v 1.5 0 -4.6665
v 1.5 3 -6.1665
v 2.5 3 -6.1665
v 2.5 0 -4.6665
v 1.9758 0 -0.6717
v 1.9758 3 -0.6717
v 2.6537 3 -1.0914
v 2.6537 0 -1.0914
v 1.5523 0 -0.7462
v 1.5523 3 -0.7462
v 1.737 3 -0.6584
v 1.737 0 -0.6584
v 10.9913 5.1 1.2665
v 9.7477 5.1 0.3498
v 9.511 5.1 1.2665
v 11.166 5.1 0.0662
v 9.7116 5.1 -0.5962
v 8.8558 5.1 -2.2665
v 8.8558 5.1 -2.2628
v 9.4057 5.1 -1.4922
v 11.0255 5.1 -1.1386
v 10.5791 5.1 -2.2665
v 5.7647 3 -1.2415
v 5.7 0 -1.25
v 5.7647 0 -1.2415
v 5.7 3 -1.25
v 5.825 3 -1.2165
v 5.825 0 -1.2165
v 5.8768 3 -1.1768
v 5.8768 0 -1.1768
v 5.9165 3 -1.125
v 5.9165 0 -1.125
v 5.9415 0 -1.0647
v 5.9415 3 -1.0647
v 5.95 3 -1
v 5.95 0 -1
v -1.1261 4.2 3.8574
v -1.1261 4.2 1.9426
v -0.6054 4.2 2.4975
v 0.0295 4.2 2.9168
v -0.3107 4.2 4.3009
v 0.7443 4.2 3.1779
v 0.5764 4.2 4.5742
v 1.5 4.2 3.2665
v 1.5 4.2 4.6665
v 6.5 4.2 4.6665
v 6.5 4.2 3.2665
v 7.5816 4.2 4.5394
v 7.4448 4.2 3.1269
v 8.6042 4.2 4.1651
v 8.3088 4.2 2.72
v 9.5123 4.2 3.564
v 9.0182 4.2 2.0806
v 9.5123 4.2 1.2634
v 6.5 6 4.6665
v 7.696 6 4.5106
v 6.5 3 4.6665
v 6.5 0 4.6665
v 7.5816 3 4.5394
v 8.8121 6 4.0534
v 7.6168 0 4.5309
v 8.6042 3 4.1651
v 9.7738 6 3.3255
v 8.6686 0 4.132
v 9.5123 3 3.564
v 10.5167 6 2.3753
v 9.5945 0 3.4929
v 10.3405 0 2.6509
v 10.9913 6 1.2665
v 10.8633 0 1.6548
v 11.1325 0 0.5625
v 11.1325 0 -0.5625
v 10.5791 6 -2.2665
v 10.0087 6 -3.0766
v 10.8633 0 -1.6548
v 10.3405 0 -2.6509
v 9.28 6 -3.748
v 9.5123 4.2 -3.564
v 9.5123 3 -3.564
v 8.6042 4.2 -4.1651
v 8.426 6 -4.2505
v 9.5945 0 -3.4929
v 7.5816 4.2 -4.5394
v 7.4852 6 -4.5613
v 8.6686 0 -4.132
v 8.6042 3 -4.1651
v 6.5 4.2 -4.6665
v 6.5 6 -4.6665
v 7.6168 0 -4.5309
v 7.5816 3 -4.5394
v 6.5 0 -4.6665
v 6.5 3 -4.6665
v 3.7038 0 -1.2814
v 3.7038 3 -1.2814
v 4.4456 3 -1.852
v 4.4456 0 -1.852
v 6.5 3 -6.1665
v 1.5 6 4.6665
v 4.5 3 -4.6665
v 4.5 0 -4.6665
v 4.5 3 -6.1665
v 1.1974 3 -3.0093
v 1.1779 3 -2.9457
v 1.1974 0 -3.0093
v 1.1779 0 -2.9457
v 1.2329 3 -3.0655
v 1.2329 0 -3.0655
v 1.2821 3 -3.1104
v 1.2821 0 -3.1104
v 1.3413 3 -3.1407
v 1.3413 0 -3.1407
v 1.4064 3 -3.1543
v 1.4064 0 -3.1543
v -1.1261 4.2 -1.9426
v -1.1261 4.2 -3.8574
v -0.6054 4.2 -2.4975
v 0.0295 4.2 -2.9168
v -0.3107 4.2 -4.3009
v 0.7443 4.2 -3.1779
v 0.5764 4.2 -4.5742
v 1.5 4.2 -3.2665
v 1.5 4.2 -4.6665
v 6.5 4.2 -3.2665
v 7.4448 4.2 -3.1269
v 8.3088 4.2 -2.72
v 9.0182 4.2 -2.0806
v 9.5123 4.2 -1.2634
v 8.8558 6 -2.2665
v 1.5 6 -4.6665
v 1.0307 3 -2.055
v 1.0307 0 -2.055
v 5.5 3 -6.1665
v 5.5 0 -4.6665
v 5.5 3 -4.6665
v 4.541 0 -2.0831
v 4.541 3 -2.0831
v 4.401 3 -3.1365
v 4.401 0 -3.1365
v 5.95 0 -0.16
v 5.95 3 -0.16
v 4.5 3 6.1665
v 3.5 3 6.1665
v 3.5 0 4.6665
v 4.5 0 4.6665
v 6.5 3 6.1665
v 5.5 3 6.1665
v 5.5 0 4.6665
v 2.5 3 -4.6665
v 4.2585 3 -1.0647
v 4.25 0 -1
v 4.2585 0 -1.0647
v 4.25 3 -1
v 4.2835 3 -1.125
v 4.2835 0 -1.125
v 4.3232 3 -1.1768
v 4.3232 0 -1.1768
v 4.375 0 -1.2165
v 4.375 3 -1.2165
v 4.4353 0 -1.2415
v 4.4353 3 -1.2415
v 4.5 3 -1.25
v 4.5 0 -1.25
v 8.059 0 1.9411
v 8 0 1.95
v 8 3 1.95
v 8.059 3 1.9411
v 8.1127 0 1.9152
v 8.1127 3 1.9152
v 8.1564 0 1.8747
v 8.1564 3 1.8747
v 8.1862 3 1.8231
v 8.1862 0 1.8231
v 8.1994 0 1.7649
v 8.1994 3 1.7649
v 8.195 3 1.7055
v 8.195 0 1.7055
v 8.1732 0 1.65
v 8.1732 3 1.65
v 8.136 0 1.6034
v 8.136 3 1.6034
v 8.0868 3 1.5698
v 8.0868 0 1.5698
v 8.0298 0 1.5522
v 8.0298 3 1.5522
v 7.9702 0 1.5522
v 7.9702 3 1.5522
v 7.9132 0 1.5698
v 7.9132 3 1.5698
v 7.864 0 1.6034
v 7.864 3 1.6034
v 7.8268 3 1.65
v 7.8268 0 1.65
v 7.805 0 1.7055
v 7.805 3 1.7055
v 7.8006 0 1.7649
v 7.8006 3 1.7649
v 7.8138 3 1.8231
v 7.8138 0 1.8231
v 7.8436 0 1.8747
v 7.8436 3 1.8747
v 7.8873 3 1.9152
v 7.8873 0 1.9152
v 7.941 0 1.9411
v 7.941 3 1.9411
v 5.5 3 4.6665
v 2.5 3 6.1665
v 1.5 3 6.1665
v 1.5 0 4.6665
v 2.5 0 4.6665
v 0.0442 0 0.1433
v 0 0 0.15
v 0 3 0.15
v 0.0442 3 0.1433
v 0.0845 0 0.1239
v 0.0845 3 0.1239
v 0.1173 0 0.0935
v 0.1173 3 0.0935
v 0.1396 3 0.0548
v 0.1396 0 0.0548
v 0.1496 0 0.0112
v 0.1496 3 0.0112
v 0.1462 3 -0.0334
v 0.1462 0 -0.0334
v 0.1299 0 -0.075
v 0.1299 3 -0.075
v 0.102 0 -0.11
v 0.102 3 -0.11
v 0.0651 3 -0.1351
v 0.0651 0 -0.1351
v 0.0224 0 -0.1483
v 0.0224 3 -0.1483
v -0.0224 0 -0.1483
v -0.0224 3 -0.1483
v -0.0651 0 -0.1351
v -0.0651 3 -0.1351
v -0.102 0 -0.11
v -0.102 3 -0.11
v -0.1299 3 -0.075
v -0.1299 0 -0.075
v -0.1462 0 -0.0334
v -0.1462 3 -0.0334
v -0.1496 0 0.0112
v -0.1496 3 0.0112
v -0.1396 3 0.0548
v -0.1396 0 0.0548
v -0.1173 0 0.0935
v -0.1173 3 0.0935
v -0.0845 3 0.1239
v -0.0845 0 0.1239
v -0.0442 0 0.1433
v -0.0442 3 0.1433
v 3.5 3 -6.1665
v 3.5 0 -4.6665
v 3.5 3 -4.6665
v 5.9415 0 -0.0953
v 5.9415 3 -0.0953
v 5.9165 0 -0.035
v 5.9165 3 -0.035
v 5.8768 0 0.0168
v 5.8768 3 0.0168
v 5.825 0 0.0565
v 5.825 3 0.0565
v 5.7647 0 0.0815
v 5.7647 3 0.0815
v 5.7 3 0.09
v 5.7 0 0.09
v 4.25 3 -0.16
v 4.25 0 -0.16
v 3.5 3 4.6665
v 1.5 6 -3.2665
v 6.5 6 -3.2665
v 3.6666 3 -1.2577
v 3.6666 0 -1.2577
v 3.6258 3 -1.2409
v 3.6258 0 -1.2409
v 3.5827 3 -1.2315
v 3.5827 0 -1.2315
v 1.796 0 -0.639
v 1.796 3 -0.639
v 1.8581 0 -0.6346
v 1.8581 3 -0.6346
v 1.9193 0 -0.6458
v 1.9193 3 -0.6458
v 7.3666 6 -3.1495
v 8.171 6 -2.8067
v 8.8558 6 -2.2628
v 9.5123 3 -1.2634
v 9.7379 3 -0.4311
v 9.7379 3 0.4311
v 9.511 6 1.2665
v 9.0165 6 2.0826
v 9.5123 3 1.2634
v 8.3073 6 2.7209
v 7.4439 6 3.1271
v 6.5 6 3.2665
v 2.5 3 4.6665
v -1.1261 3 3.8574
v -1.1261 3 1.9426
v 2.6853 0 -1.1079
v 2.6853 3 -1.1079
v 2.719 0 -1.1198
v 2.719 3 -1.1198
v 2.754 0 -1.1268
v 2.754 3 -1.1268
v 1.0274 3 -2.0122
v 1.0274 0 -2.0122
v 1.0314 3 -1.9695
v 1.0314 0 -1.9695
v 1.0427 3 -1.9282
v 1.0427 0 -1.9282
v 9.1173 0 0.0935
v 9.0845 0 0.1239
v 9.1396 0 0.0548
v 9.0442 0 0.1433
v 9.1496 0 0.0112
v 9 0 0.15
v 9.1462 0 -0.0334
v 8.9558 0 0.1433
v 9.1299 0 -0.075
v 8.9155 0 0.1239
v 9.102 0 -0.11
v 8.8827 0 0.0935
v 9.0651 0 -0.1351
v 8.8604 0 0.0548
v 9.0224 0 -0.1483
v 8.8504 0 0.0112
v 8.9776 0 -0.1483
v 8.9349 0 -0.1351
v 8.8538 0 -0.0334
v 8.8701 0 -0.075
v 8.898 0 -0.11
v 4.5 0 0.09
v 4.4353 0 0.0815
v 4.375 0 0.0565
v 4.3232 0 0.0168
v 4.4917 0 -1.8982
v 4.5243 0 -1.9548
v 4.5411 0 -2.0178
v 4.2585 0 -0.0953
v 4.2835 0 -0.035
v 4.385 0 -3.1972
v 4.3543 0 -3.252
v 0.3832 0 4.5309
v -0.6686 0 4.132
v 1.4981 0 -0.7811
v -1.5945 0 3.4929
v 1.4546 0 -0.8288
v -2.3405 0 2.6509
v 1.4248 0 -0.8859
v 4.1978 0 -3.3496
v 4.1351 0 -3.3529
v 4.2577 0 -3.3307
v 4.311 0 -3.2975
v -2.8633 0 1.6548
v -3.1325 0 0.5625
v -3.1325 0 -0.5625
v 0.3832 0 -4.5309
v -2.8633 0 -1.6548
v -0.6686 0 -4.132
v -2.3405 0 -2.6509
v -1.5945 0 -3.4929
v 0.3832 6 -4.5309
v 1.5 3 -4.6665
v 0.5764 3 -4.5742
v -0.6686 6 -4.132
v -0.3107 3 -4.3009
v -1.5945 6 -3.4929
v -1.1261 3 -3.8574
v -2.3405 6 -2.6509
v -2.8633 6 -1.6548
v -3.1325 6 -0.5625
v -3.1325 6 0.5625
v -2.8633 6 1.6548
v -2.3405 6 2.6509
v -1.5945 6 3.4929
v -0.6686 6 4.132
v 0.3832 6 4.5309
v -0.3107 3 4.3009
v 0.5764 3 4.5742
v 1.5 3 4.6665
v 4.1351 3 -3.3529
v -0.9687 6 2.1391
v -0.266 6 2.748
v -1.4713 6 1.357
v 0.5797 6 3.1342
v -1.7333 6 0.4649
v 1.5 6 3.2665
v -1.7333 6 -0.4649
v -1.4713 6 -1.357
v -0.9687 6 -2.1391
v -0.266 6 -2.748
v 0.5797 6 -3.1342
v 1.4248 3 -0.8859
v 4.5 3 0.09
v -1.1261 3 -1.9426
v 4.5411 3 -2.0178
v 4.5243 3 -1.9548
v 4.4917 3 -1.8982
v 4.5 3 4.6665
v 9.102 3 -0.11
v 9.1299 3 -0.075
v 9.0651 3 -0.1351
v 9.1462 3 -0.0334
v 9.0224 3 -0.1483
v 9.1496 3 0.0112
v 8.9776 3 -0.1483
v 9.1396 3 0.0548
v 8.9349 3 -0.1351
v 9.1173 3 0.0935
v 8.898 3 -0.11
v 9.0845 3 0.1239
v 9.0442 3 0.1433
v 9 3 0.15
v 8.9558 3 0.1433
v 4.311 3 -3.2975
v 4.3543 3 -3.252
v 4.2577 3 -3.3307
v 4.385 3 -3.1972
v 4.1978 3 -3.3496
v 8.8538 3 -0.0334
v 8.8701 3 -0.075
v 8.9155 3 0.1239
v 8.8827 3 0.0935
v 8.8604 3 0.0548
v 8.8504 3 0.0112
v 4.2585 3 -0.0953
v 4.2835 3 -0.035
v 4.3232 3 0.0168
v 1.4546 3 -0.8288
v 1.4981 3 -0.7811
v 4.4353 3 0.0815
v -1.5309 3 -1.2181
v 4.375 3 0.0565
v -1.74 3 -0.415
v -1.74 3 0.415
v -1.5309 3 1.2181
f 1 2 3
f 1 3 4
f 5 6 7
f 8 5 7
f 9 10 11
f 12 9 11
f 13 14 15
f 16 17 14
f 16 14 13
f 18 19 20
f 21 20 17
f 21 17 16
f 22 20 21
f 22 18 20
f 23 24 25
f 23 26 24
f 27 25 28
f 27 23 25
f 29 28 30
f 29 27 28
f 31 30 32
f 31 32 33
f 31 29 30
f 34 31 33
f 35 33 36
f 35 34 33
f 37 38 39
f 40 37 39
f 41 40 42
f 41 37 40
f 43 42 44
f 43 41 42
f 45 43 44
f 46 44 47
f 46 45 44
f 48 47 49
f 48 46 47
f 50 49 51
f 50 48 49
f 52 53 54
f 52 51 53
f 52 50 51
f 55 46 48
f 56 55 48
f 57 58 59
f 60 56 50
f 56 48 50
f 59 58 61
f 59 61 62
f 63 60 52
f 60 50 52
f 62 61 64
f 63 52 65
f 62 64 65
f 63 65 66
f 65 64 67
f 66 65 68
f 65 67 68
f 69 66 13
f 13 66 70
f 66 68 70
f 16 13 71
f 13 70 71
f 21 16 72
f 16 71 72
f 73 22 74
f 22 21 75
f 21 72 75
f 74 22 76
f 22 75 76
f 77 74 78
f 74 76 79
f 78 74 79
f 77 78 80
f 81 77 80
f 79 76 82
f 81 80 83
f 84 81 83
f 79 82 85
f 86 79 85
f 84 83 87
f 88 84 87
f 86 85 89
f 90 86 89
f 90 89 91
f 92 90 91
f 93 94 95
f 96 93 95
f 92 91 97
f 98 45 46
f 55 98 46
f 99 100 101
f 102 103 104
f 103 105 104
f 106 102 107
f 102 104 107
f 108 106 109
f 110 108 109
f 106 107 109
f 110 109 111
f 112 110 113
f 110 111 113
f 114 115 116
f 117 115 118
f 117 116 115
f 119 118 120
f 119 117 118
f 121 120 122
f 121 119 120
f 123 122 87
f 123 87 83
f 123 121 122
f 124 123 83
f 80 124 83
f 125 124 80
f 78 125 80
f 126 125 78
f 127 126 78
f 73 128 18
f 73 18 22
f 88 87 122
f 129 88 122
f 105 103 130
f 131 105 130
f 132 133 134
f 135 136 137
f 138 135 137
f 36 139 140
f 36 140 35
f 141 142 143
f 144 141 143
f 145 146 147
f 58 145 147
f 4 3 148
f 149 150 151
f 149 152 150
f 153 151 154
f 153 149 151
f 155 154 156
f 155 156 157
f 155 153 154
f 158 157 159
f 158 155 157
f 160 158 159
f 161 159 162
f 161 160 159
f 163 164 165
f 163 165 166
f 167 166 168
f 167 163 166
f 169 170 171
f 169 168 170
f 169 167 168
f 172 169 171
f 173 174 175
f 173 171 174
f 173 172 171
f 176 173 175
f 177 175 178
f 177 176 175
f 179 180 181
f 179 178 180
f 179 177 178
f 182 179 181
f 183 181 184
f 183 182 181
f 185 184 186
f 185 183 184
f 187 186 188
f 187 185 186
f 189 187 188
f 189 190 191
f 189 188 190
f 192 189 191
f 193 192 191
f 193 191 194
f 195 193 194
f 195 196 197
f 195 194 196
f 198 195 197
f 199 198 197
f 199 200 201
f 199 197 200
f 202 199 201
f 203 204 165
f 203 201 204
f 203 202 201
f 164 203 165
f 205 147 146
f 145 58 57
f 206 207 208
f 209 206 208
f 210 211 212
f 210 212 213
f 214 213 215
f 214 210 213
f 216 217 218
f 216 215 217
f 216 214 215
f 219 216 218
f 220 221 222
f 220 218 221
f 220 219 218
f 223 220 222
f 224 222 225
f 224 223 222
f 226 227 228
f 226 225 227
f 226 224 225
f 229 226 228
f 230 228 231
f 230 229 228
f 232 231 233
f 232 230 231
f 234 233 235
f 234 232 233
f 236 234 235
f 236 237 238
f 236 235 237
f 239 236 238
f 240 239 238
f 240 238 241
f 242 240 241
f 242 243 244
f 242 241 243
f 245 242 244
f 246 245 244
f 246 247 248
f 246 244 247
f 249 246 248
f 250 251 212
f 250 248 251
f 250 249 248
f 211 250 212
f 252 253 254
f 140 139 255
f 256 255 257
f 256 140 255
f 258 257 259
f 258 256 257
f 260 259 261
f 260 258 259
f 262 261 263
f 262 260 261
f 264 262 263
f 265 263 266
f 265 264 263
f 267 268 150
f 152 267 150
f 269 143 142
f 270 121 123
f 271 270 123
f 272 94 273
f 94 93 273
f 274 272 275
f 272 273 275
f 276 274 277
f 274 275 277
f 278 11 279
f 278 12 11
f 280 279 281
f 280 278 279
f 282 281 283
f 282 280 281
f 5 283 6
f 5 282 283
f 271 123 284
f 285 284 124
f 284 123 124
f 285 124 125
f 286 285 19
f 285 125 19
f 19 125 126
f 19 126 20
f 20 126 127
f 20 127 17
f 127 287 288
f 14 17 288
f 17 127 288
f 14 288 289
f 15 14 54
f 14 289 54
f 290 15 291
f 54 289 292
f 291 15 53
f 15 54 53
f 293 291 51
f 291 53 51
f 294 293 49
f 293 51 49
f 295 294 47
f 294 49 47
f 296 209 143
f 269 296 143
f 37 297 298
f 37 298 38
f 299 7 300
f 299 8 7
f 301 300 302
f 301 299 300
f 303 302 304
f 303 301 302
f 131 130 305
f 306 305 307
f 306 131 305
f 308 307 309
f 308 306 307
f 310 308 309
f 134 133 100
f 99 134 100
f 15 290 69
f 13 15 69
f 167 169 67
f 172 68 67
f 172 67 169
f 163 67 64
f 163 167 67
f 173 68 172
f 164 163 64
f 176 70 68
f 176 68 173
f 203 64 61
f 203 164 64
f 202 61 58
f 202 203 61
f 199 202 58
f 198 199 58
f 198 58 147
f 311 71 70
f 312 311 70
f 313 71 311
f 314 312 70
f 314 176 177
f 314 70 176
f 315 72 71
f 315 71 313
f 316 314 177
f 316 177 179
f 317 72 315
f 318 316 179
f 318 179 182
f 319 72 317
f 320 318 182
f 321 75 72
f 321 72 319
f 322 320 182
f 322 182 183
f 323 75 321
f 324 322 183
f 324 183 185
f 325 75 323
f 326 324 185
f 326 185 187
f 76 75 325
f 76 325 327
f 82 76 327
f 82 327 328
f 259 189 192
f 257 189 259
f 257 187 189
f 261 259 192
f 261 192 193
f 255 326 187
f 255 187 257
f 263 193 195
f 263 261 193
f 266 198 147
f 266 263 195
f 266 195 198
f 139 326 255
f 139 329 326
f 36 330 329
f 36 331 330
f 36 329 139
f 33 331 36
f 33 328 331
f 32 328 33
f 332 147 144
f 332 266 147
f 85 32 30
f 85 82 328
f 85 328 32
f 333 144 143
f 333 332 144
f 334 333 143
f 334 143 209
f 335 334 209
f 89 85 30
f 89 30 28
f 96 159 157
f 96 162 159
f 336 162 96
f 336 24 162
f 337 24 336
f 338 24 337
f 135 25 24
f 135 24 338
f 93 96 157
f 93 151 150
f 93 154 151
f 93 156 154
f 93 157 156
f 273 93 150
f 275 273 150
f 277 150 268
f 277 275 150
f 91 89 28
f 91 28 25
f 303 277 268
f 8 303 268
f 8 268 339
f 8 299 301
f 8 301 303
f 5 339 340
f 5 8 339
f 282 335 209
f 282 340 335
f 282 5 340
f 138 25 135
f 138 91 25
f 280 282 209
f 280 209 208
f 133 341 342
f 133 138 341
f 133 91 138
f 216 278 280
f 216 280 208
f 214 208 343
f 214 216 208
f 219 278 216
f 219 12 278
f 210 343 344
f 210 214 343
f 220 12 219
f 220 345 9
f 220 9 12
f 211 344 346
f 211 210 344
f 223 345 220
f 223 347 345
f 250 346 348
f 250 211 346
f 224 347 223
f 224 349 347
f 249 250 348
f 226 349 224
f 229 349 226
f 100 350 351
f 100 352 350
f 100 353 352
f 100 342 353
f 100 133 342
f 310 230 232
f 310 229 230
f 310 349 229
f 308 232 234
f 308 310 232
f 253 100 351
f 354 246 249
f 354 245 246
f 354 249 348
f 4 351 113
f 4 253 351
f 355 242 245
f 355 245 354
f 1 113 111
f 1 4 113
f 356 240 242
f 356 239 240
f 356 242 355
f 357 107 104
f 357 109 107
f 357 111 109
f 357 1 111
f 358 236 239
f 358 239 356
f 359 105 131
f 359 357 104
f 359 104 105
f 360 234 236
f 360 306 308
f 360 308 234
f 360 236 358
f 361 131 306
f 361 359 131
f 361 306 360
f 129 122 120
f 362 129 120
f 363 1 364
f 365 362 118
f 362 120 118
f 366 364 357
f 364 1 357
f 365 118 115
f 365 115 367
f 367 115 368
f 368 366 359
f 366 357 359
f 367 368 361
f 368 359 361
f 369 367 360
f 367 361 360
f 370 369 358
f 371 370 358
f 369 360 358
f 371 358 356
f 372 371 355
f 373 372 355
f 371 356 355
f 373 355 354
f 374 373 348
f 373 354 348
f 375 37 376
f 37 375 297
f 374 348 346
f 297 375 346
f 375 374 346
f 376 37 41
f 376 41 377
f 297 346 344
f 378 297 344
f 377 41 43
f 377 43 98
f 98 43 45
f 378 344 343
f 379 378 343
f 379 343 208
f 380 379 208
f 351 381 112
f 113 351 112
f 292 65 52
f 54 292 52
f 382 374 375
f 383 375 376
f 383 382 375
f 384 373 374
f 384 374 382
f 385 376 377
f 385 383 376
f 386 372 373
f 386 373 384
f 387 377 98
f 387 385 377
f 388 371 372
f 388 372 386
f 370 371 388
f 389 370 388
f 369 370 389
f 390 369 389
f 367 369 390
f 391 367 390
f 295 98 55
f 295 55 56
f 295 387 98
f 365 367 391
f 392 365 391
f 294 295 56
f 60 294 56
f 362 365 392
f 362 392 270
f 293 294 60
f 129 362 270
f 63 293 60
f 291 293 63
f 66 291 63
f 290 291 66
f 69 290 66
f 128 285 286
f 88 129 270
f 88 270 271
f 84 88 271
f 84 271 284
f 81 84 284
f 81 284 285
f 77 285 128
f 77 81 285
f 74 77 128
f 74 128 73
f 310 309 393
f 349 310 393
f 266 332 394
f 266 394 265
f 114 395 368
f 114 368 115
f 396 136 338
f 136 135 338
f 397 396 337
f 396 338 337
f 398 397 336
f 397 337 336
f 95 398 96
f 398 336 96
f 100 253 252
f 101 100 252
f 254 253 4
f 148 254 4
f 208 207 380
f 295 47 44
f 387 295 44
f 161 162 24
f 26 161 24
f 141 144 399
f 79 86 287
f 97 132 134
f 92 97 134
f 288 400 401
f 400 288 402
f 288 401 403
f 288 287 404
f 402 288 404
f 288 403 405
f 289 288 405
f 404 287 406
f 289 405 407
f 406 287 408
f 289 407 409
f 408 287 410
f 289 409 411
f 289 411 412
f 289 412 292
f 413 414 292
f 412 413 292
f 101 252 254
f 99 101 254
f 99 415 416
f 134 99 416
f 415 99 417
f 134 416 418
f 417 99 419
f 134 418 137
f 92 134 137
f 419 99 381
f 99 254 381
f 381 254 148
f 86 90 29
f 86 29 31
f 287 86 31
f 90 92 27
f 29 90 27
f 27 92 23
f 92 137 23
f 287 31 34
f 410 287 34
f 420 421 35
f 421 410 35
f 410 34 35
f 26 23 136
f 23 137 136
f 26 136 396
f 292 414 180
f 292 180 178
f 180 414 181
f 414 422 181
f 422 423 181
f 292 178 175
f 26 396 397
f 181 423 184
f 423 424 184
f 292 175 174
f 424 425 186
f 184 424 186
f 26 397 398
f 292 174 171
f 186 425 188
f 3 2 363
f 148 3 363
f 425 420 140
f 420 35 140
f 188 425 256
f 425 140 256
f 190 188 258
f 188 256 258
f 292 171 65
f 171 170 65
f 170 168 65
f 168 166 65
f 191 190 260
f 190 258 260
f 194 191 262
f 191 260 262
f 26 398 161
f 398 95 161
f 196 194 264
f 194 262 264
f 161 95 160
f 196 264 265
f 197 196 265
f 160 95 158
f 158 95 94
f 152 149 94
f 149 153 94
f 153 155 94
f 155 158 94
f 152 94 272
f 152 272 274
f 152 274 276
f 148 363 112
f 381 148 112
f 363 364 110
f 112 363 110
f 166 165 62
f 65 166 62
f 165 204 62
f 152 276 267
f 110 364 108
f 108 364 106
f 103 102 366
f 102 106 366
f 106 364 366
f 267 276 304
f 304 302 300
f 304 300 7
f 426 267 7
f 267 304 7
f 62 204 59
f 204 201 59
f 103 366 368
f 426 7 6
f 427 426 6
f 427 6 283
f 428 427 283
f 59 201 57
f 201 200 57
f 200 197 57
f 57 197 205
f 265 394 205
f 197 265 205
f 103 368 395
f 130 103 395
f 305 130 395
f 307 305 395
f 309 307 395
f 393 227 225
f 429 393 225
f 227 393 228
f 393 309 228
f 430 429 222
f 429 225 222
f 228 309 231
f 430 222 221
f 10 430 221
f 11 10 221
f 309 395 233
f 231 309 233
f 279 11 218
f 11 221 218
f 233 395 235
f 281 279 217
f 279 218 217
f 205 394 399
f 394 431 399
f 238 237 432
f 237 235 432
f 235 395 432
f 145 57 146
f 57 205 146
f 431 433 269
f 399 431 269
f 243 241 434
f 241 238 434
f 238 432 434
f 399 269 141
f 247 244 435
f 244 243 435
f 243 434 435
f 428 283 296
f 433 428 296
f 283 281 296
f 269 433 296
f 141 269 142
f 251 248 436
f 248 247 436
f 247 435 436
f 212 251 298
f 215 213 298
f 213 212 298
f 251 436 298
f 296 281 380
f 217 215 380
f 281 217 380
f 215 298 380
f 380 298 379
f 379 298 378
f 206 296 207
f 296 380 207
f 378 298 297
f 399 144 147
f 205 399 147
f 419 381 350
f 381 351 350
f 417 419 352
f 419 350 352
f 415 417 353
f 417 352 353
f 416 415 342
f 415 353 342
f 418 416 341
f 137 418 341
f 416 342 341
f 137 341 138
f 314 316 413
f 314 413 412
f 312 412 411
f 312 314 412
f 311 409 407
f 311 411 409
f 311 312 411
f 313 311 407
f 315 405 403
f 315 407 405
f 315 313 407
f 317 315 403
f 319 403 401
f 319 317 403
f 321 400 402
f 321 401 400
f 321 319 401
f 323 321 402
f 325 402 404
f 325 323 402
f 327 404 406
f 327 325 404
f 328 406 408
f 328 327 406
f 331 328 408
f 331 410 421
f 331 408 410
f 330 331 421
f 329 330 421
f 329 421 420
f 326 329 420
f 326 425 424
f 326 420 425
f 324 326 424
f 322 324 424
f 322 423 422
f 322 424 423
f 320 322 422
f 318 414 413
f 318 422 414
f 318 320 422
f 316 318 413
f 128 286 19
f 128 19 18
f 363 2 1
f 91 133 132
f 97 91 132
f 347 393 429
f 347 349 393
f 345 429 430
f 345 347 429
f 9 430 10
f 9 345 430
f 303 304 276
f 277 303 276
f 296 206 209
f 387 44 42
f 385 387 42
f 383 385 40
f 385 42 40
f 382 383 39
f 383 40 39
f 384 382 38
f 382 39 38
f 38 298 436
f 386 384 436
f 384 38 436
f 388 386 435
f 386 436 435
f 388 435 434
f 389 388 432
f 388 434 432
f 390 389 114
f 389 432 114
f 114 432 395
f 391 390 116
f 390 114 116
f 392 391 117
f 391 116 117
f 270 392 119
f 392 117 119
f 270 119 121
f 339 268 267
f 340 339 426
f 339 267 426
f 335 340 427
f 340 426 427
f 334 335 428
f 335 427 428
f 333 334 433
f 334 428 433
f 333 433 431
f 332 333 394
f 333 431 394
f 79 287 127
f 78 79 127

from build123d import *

# Parameters (mm, degrees)
LIP_DEPTH                    = 6
BASE_DEPTH                   = 3
LAMDABREGMAGUIDES_DEPTH      = 5
LAMDABREGMAGUIDES_DEPTH_BACK = 5
SKETCH16_R                   = 0.15
SKETCH16_R_2                 = 0.2
SKETCH3_W                    = 10.638387248
SKETCH3_H                    = 1.2
CUT4ACRYLIC_DEPTH            = 10
SKETCH4_W                    = 2.35
SKETCH4_H                    = 3.533
CUTFORGROUNDPIN_DEPTH        = 0.9
BOSS_EXTRUDE6_DEPTH          = 1
CRVPATTERN1_START            = 3.5
CRVPATTERN1_DEPTH            = 1
CRVPATTERN1_START_2          = 5.5
CRVPATTERN1_2_DEPTH          = 1
BOSS_EXTRUDE7_DEPTH          = 1
CRVPATTERN5_START            = 3.5
CRVPATTERN5_DEPTH            = 1
CRVPATTERN5_START_2          = 5.5
CRVPATTERN5_2_DEPTH          = 1
CUT_EXTRUDE1_DEPTH           = 10
CUT_EXTRUDE3_DEPTH           = 10
CUT_EXTRUDE3_DEPTH_BACK      = 10
SKETCH32_W                   = 1.7
SKETCH32_H                   = 1.34
FILLET1_R                    = 0.25


# Read off the part's stored shape, not the designer's step: Lip, CrvPattern1, CrvPattern5
with BuildPart() as part:
    # Lip outline → Lip (new body)
    with BuildSketch(Plane(origin=(0, 0, 0), x_dir=(1, 0, 0), z_dir=(0, 1, 0))):
        with BuildLine():
            ThreePointArc((1.5, 4.6665), (-3.1665, 0), (1.5, -4.6665))
            Line((1.5, -4.6665), (6.5, -4.6665))
            ThreePointArc((6.5, -4.6665), (11.1665, 0), (6.5, 4.6665))
            Line((6.5, 4.6665), (1.5, 4.6665))
        make_face()
        with BuildLine():
            Line((6.5, -3.2665), (1.5, -3.2665))
            ThreePointArc((1.5, -3.2665), (-1.7665, 0), (1.5, 3.2665))
            Line((1.5, 3.2665), (6.5, 3.2665))
            ThreePointArc((6.5, 3.2665), (9.7665, 0), (6.5, -3.2665))
        make_face(mode=Mode.SUBTRACT)
    extrude(amount=LIP_DEPTH)

    # Sketch2 → Base (add)
    with BuildSketch(Plane(origin=(0, 0, 0), x_dir=(1, 0, 0), z_dir=(0, 1, 0))):
        with BuildLine():
            Line((6.5, -3.2665), (1.5, -3.2665))
            ThreePointArc((1.5, -3.2665), (-1.7665, 0), (1.5, 3.2665))
            Line((1.5, 3.2665), (6.5, 3.2665))
            ThreePointArc((6.5, 3.2665), (9.7665, 0), (6.5, -3.2665))
        make_face()
    extrude(amount=BASE_DEPTH)

    # Sketch16 → LamdaBregmaGuides (cut, two sides: drawn at the far end of the back side and taken through both)
    with BuildSketch(Plane(origin=(0, 0, 0), x_dir=(1, 0, 0), z_dir=(0, 1, 0)).offset(-LAMDABREGMAGUIDES_DEPTH_BACK)):
        with Locations(Location((0, 0, 0), (0, 0, 270))):
            Circle(SKETCH16_R)
        with Locations(Location((9, 0, 0), (0, 0, 270))):
            Circle(SKETCH16_R)
        with Locations(Location((8, -1.75, 0), (0, 0, 270))):
            Circle(SKETCH16_R_2)
    extrude(amount=LAMDABREGMAGUIDES_DEPTH + LAMDABREGMAGUIDES_DEPTH_BACK, mode=Mode.SUBTRACT)

    # Sketch3 → Cut4Acrylic (cut)
    with BuildSketch(Plane.XY.offset(4.6665)):
        with Locations((4.193105486, 3.6)):
            Rectangle(SKETCH3_W, SKETCH3_H)
    extrude(amount=-CUT4ACRYLIC_DEPTH, mode=Mode.SUBTRACT)

    # Sketch4 → CutforGroundPin (cut)
    with BuildSketch(Plane(origin=(0, 6, 0), x_dir=(1, 0, 0), z_dir=(0, 1, 0))):
        with Locations((10.030760676, 0.5)):
            Rectangle(SKETCH4_W, SKETCH4_H)
    extrude(amount=-CUTFORGROUNDPIN_DEPTH, mode=Mode.SUBTRACT)

    # Sketch21 → Boss-Extrude6 (add)
    with BuildSketch(Plane(origin=(1.5, 0, 0), x_dir=(0, 0, -1), z_dir=(1, 0, 0))):
        Polygon((-4.6665, 3), (-6.1665, 3), (-4.6665, 0), align=None)
    extrude(amount=BOSS_EXTRUDE6_DEPTH)

    # CrvPattern1 outline → CrvPattern1 (add)
    with BuildSketch(Plane.YZ.offset(CRVPATTERN1_START)):
        Polygon((0, 4.6665), (3, 4.6665), (3, 6.1665), align=None)
    extrude(amount=CRVPATTERN1_DEPTH)

    # CrvPattern1 2 outline → CrvPattern1 2 (add)
    with BuildSketch(Plane.YZ.offset(CRVPATTERN1_START_2)):
        Polygon((0, 4.6665), (3, 4.6665), (3, 6.1665), align=None)
    extrude(amount=CRVPATTERN1_2_DEPTH)

    # Sketch22 → Boss-Extrude7 (add)
    with BuildSketch(Plane(origin=(1.5, 0, 0), x_dir=(0, 0, -1), z_dir=(1, 0, 0))):
        Polygon((4.6665, 0), (4.6665, 3), (6.1665, 3), align=None)
    extrude(amount=BOSS_EXTRUDE7_DEPTH)

    # CrvPattern5 outline → CrvPattern5 (add)
    with BuildSketch(Plane.YZ.offset(CRVPATTERN5_START)):
        Polygon((0, -4.6665), (3, -6.1665), (3, -4.6665), align=None)
    extrude(amount=CRVPATTERN5_DEPTH)

    # CrvPattern5 2 outline → CrvPattern5 2 (add)
    with BuildSketch(Plane.YZ.offset(CRVPATTERN5_START_2)):
        Polygon((0, -4.6665), (3, -6.1665), (3, -4.6665), align=None)
    extrude(amount=CRVPATTERN5_2_DEPTH)

    # Sketch31 → Cut-Extrude1 (cut)
    with BuildSketch(Plane(origin=(0, 3, 0), x_dir=(1, 0, 0), z_dir=(0, 1, 0))):
        Polygon((1.21, 3.14), (1.02, 1.99), (1.46, 0.79), (1.86, 0.6), (2.7, 1.12), (3.65, 1.24), (4.56, 1.94), (4.37, 3.37), align=None)
    extrude(amount=-CUT_EXTRUDE1_DEPTH, mode=Mode.SUBTRACT)

    # Sketch32 → Cut-Extrude3 (cut, two sides: drawn at the far end of the back side and taken through both)
    with BuildSketch(Plane(origin=(0, 0, 0), x_dir=(1, 0, 0), z_dir=(0, 1, 0)).offset(-CUT_EXTRUDE3_DEPTH_BACK)):
        with Locations((5.1, 0.58)):
            Rectangle(SKETCH32_W, SKETCH32_H)
    extrude(amount=CUT_EXTRUDE3_DEPTH + CUT_EXTRUDE3_DEPTH_BACK, mode=Mode.SUBTRACT)

    # Fillet1
    fillet1_edges = [part.edges().sort_by_distance(p)[0] for p in [
        (1.21, 1.5, -3.14),
        (4.37, 1.5, -3.37),
        (4.56, 1.5, -1.94),
        (3.65, 1.5, -1.24),
        (2.7, 1.5, -1.12),
        (1.86, 1.5, -0.6),
        (1.46, 1.5, -0.79),
        (1.02, 1.5, -1.99),
        (5.95, 1.5, 0.09),
        (5.95, 1.5, -1.25),
        (4.25, 1.5, -1.25),
        (4.25, 1.5, 0.09),
    ]]
    fillet(fillet1_edges, radius=FILLET1_R)


solid = part.part
